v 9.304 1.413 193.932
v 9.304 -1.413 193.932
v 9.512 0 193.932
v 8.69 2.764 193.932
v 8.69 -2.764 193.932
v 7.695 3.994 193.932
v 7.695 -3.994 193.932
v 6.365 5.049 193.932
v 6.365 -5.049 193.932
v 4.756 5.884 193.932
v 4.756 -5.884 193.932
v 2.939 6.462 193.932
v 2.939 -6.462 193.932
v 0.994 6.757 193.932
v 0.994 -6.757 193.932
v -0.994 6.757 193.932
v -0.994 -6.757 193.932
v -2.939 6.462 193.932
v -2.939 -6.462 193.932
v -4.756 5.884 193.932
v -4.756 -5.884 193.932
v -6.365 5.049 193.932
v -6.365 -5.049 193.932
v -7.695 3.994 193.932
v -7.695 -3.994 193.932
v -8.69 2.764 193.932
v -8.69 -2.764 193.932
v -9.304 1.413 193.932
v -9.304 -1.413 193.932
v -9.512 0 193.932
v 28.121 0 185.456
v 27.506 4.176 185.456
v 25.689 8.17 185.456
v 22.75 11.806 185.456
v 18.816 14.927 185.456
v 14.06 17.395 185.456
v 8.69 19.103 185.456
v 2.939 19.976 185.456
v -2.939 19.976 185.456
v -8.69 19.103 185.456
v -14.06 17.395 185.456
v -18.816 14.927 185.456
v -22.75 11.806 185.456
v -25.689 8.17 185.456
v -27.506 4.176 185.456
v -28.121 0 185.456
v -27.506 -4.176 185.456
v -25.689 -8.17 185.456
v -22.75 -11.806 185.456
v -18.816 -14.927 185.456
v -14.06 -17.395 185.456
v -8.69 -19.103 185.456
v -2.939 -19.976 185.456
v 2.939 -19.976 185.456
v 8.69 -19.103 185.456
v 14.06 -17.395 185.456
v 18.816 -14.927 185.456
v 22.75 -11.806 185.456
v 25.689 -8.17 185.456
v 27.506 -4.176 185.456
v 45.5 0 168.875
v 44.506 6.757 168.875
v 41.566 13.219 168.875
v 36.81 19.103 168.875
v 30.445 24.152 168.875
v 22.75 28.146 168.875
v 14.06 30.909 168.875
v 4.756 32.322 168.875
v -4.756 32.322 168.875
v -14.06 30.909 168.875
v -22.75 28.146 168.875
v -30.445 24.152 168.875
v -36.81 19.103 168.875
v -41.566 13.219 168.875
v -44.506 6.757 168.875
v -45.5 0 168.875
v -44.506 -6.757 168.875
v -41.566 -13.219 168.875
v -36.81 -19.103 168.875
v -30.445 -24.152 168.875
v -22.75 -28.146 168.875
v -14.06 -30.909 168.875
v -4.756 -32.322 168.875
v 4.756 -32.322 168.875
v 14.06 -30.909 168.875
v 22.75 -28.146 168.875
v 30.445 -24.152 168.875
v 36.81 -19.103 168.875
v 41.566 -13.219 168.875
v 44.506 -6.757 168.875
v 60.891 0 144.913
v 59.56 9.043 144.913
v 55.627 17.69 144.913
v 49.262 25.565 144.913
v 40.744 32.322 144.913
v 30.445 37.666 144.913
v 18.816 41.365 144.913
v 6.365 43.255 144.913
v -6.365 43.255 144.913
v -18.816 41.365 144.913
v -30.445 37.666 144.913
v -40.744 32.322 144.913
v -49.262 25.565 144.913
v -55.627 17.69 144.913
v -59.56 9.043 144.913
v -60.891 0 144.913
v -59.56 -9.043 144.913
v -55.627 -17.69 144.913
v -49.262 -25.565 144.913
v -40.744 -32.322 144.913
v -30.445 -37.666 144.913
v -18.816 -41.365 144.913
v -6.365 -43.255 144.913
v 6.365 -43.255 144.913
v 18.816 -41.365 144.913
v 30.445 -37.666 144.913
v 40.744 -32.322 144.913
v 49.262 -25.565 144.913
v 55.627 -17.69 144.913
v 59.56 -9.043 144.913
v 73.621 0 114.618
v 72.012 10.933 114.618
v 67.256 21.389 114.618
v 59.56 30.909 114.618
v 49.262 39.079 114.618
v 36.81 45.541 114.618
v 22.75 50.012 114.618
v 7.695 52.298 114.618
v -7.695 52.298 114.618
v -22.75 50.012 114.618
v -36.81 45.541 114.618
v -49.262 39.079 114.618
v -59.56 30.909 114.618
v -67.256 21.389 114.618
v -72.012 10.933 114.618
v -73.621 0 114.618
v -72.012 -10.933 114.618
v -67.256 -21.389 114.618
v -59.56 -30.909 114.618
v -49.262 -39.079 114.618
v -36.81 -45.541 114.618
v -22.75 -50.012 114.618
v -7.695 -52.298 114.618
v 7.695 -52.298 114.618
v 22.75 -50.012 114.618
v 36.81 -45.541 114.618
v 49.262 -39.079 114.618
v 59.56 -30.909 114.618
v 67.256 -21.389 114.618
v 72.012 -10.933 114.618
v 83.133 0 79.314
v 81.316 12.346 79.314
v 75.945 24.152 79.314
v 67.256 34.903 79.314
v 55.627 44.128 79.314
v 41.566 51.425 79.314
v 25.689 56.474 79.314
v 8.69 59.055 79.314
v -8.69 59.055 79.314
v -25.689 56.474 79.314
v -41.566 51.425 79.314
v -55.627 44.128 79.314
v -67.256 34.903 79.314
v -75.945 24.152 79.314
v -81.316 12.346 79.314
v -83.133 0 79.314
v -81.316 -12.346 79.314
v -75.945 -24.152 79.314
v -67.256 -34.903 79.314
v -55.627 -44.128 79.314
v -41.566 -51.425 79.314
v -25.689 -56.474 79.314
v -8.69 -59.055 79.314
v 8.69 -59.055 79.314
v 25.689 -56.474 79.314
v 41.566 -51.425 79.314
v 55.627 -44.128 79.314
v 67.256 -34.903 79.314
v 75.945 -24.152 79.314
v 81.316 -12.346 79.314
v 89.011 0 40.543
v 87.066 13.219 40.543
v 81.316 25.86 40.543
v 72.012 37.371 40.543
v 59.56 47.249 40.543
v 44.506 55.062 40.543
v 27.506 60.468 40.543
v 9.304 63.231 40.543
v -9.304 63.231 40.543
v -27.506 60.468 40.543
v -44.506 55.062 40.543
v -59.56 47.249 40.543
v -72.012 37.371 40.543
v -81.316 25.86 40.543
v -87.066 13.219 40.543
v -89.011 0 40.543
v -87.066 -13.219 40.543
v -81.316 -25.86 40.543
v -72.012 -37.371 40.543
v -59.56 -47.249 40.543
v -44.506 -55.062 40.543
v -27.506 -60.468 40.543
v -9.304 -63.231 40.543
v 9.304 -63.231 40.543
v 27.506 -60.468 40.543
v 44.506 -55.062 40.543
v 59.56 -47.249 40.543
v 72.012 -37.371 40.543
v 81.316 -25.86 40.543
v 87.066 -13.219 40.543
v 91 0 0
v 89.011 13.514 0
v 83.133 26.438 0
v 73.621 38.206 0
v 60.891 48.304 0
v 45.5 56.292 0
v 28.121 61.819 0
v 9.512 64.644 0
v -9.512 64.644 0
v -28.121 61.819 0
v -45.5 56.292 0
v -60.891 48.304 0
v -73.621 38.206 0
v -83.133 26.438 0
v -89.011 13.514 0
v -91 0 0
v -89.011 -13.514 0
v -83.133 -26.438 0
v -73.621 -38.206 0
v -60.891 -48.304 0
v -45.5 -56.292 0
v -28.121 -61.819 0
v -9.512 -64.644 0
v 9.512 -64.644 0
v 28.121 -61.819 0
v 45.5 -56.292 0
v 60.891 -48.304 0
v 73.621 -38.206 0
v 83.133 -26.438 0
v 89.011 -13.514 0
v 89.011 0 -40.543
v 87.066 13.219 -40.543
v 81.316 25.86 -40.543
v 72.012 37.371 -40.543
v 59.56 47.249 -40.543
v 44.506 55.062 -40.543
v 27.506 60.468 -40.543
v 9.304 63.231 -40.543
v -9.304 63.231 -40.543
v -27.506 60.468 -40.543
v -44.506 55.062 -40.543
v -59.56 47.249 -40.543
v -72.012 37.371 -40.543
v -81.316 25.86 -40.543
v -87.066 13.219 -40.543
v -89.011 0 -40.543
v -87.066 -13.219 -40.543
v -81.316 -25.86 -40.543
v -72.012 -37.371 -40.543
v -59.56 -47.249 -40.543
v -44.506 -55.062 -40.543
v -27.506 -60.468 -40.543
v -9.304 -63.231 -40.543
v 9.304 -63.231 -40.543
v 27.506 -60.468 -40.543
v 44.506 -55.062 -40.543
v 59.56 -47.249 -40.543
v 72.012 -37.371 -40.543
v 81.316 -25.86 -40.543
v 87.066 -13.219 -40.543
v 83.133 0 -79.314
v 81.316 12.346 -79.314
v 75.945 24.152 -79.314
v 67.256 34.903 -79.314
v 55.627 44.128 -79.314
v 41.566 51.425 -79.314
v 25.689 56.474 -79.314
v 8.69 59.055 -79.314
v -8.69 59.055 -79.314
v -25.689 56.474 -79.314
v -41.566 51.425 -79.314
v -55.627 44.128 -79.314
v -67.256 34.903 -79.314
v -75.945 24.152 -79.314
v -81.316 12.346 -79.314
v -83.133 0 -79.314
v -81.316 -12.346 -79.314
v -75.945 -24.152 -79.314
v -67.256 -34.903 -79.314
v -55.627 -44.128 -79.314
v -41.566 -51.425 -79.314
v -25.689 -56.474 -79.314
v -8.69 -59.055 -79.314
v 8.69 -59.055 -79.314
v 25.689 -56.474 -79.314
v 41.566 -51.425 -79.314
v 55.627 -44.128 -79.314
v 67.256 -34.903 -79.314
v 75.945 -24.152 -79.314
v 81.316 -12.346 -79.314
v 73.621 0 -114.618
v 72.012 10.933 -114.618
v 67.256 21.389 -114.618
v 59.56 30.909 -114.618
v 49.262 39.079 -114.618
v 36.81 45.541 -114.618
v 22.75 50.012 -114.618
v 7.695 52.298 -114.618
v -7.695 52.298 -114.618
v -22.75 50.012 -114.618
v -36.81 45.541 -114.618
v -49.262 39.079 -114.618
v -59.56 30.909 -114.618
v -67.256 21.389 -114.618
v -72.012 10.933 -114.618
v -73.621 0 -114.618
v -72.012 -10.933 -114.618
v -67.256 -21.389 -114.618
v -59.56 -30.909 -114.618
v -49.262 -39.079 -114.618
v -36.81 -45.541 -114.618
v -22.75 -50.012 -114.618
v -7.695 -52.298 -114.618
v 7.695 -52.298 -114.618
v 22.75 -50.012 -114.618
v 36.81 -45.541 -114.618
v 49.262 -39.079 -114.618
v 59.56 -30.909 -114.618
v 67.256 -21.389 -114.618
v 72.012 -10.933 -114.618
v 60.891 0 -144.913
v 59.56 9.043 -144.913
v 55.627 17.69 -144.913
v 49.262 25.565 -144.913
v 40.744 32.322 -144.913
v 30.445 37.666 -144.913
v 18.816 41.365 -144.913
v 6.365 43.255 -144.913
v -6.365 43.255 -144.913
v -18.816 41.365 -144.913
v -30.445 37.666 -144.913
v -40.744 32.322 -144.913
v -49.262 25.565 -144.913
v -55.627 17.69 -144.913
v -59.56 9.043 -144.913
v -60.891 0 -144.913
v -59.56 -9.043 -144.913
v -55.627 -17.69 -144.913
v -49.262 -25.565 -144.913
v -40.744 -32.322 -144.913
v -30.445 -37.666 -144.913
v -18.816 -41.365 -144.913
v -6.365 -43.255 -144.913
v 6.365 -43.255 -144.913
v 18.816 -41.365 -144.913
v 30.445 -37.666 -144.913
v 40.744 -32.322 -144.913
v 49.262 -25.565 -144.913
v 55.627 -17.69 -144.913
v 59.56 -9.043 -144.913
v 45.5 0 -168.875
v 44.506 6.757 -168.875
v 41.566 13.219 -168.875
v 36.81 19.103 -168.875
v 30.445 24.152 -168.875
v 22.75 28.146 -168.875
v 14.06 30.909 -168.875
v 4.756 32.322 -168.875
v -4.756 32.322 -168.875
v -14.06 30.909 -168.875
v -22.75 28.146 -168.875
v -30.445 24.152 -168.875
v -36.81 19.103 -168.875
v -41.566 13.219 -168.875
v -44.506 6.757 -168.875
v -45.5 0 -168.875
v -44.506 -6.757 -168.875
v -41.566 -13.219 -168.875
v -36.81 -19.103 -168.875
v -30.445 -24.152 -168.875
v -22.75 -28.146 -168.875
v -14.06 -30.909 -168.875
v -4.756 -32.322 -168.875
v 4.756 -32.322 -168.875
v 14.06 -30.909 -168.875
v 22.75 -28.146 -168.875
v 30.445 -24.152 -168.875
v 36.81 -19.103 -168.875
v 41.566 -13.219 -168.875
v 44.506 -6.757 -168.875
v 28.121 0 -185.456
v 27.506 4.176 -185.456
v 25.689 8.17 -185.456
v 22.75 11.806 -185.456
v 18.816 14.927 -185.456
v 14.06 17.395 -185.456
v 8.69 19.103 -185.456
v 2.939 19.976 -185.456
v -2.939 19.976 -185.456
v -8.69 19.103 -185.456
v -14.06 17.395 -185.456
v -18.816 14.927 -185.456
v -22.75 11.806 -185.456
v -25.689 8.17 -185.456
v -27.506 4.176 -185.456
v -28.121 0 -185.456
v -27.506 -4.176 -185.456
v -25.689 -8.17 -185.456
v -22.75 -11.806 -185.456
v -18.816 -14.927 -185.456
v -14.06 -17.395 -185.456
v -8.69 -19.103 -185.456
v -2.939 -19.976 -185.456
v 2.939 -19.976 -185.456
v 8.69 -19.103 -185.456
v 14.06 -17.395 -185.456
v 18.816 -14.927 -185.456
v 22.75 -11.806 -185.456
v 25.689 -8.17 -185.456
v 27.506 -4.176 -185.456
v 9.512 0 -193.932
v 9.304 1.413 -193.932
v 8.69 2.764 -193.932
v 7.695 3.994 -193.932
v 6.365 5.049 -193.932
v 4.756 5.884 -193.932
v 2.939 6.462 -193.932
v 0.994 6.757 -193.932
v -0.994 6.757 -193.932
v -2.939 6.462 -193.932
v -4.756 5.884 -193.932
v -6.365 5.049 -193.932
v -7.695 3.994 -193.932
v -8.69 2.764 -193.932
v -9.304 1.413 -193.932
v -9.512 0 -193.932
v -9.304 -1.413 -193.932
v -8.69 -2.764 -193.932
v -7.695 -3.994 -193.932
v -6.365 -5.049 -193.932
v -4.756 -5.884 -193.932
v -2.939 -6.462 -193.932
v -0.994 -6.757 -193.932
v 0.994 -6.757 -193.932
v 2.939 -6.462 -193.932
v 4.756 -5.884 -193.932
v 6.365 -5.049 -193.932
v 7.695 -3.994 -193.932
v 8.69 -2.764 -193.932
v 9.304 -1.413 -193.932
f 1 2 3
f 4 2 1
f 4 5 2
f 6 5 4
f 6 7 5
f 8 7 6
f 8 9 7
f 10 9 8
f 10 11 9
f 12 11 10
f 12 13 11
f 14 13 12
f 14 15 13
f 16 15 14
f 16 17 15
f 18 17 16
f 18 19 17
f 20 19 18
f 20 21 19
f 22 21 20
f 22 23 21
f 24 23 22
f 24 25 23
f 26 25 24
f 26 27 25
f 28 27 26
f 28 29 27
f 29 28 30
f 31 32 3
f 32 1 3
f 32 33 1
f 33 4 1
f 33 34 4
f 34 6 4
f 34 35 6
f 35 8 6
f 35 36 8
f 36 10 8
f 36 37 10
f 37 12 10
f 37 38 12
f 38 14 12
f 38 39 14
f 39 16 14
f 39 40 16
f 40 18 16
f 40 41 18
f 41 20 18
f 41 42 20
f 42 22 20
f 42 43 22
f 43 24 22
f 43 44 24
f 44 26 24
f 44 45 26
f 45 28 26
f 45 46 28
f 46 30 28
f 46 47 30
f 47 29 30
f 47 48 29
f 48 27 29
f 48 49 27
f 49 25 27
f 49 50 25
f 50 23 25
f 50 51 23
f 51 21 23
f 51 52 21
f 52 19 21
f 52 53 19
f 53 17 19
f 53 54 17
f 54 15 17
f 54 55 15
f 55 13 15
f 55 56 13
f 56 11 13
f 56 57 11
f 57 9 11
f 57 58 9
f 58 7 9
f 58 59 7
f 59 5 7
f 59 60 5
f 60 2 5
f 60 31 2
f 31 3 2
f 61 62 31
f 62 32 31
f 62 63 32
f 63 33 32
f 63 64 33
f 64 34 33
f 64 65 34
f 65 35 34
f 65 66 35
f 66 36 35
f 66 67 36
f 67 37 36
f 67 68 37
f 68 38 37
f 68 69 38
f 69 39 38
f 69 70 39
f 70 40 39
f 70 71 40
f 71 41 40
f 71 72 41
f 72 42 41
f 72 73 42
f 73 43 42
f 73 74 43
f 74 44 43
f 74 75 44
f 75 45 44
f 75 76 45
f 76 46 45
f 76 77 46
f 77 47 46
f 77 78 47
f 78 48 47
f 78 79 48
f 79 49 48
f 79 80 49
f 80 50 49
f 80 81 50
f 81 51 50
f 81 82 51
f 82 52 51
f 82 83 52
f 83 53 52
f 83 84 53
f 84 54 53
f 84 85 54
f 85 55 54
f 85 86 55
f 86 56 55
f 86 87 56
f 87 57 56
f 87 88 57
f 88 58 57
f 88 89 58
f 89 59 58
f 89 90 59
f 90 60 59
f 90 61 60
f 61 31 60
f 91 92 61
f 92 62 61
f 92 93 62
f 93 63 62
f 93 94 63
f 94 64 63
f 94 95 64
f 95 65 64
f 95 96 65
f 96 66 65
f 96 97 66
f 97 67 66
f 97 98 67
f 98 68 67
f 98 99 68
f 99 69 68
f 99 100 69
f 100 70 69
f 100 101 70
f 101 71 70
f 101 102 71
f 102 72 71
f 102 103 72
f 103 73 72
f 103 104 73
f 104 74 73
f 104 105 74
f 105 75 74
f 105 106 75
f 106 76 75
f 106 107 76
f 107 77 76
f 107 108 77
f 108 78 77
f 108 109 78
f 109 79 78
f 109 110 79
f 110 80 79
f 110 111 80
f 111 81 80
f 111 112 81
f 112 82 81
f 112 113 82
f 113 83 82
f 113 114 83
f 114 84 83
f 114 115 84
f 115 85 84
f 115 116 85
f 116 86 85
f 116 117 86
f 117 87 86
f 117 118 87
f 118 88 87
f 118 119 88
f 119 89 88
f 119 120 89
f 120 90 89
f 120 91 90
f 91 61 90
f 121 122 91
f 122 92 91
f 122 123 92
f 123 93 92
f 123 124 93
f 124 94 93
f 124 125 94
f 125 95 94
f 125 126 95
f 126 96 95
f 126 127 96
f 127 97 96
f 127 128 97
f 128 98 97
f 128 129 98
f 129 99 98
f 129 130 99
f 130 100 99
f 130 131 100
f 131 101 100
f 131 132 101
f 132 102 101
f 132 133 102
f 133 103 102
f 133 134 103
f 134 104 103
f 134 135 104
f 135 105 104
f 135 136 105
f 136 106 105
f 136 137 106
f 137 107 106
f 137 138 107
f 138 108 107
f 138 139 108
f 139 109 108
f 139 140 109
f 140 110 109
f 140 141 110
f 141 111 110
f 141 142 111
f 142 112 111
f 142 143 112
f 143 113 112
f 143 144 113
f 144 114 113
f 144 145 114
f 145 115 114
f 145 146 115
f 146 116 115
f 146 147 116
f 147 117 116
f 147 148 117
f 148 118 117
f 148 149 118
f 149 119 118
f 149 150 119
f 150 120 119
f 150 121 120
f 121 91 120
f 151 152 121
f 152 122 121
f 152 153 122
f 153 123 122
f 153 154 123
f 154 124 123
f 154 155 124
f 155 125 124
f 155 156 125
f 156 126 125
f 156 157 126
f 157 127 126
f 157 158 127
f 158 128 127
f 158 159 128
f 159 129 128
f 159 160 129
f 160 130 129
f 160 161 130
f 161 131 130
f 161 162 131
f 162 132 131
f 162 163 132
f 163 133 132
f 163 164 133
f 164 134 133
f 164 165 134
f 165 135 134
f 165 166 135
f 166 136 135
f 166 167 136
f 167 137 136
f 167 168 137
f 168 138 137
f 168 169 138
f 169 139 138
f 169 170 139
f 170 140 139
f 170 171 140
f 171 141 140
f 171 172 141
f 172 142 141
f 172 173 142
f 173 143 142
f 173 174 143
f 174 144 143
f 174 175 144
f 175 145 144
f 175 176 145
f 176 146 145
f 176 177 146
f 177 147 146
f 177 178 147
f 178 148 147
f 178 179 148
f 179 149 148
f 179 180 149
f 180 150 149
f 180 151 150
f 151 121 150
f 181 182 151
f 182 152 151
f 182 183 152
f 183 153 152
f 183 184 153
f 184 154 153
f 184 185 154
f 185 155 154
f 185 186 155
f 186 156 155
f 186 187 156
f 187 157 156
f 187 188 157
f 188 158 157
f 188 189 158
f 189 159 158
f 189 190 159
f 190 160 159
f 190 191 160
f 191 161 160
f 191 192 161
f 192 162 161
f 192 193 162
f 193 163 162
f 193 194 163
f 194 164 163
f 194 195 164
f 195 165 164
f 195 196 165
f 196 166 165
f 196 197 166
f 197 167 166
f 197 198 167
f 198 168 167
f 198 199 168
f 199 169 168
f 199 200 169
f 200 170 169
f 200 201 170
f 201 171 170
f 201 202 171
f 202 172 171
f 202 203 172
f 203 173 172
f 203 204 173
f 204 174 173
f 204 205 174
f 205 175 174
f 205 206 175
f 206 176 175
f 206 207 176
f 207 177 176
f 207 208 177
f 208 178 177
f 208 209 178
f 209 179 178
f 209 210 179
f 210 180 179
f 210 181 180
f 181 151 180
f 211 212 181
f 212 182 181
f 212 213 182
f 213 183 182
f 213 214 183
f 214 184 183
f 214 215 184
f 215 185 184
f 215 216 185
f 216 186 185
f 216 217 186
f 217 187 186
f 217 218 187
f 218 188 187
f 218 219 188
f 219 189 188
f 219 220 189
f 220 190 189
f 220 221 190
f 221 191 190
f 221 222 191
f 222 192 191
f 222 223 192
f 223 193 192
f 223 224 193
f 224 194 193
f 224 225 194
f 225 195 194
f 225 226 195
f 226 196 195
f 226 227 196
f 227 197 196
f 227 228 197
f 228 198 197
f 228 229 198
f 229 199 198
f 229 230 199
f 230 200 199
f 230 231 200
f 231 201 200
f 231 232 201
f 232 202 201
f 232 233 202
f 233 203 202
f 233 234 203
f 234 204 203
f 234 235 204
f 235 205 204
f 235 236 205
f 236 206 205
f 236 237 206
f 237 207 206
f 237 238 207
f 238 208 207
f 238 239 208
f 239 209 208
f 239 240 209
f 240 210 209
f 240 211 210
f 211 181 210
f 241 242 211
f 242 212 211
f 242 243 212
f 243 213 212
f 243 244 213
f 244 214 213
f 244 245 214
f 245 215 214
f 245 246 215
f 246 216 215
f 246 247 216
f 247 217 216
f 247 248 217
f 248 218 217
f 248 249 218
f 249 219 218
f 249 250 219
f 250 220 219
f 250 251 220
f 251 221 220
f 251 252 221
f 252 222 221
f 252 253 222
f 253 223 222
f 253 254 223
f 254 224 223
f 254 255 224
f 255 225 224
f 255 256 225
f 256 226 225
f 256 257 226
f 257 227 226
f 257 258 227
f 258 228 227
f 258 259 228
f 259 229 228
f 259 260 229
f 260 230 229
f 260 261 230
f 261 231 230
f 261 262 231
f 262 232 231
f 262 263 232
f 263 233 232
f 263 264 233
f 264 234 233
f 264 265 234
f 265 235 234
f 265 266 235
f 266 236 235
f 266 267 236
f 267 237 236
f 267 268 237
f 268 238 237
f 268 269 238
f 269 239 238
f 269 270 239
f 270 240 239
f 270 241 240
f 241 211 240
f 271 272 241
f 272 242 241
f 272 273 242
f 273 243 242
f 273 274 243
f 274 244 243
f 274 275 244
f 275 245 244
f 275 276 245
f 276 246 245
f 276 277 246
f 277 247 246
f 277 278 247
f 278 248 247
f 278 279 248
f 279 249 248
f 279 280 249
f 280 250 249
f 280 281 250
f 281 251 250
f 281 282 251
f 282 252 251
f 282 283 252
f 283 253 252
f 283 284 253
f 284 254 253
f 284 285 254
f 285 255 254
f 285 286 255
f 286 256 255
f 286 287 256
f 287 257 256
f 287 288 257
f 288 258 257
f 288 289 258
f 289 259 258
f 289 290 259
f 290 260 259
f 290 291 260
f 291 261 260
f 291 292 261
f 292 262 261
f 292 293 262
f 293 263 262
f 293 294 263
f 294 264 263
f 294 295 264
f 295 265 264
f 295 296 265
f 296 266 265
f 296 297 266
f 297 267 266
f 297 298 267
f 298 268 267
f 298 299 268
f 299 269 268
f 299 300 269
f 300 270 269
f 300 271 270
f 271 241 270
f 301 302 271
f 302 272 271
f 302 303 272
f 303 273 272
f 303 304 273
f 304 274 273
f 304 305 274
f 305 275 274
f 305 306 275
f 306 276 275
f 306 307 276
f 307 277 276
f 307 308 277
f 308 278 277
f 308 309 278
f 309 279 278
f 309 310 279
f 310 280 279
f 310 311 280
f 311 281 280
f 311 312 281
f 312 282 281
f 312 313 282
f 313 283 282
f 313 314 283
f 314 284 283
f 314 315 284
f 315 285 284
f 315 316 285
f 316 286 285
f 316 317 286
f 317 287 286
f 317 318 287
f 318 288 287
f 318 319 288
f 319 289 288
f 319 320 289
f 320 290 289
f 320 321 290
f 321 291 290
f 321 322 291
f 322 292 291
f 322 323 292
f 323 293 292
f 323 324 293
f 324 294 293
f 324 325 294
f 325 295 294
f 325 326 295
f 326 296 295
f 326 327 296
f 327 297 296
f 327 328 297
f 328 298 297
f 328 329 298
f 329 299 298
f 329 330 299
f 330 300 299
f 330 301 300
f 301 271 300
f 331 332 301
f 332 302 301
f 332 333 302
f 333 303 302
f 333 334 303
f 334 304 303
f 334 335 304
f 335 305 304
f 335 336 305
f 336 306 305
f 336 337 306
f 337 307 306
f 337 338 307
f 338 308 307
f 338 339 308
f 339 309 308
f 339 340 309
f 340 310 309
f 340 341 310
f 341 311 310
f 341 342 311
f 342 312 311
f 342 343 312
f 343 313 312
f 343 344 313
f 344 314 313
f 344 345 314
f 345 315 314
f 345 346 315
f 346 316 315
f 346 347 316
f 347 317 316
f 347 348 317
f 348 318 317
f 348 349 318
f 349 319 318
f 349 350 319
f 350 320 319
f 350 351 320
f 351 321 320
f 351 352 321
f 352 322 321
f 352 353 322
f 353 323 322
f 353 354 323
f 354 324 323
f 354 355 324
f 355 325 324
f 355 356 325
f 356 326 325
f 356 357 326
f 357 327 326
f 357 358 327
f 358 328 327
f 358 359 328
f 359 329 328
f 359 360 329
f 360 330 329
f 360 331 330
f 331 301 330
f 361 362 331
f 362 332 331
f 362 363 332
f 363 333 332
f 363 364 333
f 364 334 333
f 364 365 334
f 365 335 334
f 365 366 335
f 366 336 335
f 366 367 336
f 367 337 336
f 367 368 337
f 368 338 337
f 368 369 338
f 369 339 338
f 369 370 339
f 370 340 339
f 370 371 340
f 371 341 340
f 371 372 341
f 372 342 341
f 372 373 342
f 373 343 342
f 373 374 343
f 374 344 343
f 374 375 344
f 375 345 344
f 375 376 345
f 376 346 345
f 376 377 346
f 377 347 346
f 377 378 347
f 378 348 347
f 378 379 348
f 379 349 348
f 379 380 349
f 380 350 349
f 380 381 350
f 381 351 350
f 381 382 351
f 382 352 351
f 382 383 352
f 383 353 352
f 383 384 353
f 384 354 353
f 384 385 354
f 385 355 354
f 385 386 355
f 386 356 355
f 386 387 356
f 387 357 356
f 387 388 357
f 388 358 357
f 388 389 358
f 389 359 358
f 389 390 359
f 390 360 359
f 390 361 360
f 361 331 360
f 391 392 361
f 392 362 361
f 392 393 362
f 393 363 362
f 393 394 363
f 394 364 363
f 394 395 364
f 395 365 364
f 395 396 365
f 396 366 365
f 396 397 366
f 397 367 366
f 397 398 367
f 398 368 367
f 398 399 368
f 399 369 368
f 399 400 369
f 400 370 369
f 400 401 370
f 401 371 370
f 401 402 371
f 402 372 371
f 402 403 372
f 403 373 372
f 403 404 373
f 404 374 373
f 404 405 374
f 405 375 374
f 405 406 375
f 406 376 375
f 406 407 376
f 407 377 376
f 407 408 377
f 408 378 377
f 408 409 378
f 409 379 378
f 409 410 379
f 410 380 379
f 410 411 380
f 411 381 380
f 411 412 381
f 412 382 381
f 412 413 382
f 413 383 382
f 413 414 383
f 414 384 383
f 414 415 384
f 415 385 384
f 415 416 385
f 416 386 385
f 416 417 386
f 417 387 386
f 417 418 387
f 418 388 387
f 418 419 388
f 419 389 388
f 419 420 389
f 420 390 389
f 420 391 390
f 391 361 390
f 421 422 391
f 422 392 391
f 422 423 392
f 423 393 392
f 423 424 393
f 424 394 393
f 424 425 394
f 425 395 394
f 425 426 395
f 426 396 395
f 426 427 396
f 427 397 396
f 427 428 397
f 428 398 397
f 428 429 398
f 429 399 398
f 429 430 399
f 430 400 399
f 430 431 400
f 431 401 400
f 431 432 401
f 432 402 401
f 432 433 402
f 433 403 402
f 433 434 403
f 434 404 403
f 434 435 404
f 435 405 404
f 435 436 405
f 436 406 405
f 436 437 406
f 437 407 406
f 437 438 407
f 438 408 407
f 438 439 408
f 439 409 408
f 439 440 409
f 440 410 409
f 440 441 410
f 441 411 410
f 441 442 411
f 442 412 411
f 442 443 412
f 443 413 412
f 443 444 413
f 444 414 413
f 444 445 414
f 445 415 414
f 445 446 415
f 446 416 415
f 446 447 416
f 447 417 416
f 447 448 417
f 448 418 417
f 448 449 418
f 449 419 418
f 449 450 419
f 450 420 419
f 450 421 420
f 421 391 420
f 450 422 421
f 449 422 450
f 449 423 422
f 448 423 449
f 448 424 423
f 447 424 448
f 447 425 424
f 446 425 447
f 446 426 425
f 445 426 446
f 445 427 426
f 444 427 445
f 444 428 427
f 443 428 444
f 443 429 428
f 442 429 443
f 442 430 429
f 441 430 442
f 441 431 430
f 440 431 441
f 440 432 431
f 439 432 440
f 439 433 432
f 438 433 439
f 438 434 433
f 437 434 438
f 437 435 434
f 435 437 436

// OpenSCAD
// Generated by SolidPython 1.0.1 on 2020-07-29 00:46:47


scale(v = [7, 5, 15]) {
	sphere(r = 13);
}
/***********************************************
*********      SolidPython code:      **********
************************************************
 
# import packages: SolidPython
from solid import *
from solid.utils import *
from itertools import chain, combinations, permutations


class Resize:

    def __init__(self, scad_file):
        self.scad_file = scad_file
        #self.scad_file = import_scad(scad_file)
        # cone/cylinder param:
        self.r1 = 0
        self.r2 = 0
        self.h = 0
        # rectangular prism param:
        self.w = 0
        self.l = 0
        # ellipse param:
        self.r = 0

    # import OpenScad code (file name corresponds to shape)


    # classify shape + parameters
    def assign(self, param1, param2, param3):
        if self.scad_file == 'cone.scad':
            self.r1 = param1
            self.r2 = param2
            self.h = param3
        elif self.scad_file == 'cylinder.scad':
            self.r1 = param1
            self.r2 = param2
            self.h = param3
        elif self.scad_file == 'rectangularPrism.scad':
            self.h = param1
            self.l = param2
            self.w = param3
        else:
            self.r = param1
            self.h = param2

    # resize parameters
    def iterate(self):
        x = range(3, 20, 2)
        i = 1
        if self.scad_file == 'cone.scad':
            tempList = list(permutations(x, 2))
            for temp in tempList:
                param1 = temp[0]
                param2 = temp[1]
                filepath = 'produced_scad_files/' + 'cone' + str(param1) + '_' + str(param2) + '_' + '.scad'
                scad_render_to_file(cylinder(h=param1, r1=param2, r2=0), filepath)

        elif self.scad_file == 'cylinder.scad':
            tempList = list(permutations(x, 3))
            for temp in tempList:
                param1 = temp[0]
                param2 = temp[1]
                filepath = 'produced_scad_files/' + 'cylinder' + str(param1) + '_' + str(param2) + '_' + '.scad'
                scad_render_to_file(cylinder(h=param1, r1=param2, r2=param2), filepath)

        elif self.scad_file == 'rectangularPrism.scad':
            tempList = list(permutations(x, 3))
            for temp in tempList:
                param1 = temp[0]
                param2 = temp[1]
                param3 = temp[2]
                filepath = 'produced_scad_files/' + 'rectangularPrism' + str(param1) + '_' + str(param2) + '_' + str(
                    param3) + '.scad'
                scad_render_to_file(cube(size=(param1, param2, param3)), filepath)

        elif self.scad_file == 'ellipse.scad':
            tempList = list(permutations(x, 4))
            for temp in tempList:
                param1 = temp[0]
                param2 = temp[1]
                param3 = temp[2]
                param4 = temp[3]
                filepath = 'produced_scad_files/' + 'ellipse' + str(param1) + '_' + str(param2) + '_' + str(param3) + '_' + str(param4) + '.scad'
                scad_render_to_file(scale([param1, param2, param3])(sphere(r=param4)), filepath)

    def render_to_scadfile(self):
        scad_render_to_file(scad, 'example.scad') 
 
************************************************/
